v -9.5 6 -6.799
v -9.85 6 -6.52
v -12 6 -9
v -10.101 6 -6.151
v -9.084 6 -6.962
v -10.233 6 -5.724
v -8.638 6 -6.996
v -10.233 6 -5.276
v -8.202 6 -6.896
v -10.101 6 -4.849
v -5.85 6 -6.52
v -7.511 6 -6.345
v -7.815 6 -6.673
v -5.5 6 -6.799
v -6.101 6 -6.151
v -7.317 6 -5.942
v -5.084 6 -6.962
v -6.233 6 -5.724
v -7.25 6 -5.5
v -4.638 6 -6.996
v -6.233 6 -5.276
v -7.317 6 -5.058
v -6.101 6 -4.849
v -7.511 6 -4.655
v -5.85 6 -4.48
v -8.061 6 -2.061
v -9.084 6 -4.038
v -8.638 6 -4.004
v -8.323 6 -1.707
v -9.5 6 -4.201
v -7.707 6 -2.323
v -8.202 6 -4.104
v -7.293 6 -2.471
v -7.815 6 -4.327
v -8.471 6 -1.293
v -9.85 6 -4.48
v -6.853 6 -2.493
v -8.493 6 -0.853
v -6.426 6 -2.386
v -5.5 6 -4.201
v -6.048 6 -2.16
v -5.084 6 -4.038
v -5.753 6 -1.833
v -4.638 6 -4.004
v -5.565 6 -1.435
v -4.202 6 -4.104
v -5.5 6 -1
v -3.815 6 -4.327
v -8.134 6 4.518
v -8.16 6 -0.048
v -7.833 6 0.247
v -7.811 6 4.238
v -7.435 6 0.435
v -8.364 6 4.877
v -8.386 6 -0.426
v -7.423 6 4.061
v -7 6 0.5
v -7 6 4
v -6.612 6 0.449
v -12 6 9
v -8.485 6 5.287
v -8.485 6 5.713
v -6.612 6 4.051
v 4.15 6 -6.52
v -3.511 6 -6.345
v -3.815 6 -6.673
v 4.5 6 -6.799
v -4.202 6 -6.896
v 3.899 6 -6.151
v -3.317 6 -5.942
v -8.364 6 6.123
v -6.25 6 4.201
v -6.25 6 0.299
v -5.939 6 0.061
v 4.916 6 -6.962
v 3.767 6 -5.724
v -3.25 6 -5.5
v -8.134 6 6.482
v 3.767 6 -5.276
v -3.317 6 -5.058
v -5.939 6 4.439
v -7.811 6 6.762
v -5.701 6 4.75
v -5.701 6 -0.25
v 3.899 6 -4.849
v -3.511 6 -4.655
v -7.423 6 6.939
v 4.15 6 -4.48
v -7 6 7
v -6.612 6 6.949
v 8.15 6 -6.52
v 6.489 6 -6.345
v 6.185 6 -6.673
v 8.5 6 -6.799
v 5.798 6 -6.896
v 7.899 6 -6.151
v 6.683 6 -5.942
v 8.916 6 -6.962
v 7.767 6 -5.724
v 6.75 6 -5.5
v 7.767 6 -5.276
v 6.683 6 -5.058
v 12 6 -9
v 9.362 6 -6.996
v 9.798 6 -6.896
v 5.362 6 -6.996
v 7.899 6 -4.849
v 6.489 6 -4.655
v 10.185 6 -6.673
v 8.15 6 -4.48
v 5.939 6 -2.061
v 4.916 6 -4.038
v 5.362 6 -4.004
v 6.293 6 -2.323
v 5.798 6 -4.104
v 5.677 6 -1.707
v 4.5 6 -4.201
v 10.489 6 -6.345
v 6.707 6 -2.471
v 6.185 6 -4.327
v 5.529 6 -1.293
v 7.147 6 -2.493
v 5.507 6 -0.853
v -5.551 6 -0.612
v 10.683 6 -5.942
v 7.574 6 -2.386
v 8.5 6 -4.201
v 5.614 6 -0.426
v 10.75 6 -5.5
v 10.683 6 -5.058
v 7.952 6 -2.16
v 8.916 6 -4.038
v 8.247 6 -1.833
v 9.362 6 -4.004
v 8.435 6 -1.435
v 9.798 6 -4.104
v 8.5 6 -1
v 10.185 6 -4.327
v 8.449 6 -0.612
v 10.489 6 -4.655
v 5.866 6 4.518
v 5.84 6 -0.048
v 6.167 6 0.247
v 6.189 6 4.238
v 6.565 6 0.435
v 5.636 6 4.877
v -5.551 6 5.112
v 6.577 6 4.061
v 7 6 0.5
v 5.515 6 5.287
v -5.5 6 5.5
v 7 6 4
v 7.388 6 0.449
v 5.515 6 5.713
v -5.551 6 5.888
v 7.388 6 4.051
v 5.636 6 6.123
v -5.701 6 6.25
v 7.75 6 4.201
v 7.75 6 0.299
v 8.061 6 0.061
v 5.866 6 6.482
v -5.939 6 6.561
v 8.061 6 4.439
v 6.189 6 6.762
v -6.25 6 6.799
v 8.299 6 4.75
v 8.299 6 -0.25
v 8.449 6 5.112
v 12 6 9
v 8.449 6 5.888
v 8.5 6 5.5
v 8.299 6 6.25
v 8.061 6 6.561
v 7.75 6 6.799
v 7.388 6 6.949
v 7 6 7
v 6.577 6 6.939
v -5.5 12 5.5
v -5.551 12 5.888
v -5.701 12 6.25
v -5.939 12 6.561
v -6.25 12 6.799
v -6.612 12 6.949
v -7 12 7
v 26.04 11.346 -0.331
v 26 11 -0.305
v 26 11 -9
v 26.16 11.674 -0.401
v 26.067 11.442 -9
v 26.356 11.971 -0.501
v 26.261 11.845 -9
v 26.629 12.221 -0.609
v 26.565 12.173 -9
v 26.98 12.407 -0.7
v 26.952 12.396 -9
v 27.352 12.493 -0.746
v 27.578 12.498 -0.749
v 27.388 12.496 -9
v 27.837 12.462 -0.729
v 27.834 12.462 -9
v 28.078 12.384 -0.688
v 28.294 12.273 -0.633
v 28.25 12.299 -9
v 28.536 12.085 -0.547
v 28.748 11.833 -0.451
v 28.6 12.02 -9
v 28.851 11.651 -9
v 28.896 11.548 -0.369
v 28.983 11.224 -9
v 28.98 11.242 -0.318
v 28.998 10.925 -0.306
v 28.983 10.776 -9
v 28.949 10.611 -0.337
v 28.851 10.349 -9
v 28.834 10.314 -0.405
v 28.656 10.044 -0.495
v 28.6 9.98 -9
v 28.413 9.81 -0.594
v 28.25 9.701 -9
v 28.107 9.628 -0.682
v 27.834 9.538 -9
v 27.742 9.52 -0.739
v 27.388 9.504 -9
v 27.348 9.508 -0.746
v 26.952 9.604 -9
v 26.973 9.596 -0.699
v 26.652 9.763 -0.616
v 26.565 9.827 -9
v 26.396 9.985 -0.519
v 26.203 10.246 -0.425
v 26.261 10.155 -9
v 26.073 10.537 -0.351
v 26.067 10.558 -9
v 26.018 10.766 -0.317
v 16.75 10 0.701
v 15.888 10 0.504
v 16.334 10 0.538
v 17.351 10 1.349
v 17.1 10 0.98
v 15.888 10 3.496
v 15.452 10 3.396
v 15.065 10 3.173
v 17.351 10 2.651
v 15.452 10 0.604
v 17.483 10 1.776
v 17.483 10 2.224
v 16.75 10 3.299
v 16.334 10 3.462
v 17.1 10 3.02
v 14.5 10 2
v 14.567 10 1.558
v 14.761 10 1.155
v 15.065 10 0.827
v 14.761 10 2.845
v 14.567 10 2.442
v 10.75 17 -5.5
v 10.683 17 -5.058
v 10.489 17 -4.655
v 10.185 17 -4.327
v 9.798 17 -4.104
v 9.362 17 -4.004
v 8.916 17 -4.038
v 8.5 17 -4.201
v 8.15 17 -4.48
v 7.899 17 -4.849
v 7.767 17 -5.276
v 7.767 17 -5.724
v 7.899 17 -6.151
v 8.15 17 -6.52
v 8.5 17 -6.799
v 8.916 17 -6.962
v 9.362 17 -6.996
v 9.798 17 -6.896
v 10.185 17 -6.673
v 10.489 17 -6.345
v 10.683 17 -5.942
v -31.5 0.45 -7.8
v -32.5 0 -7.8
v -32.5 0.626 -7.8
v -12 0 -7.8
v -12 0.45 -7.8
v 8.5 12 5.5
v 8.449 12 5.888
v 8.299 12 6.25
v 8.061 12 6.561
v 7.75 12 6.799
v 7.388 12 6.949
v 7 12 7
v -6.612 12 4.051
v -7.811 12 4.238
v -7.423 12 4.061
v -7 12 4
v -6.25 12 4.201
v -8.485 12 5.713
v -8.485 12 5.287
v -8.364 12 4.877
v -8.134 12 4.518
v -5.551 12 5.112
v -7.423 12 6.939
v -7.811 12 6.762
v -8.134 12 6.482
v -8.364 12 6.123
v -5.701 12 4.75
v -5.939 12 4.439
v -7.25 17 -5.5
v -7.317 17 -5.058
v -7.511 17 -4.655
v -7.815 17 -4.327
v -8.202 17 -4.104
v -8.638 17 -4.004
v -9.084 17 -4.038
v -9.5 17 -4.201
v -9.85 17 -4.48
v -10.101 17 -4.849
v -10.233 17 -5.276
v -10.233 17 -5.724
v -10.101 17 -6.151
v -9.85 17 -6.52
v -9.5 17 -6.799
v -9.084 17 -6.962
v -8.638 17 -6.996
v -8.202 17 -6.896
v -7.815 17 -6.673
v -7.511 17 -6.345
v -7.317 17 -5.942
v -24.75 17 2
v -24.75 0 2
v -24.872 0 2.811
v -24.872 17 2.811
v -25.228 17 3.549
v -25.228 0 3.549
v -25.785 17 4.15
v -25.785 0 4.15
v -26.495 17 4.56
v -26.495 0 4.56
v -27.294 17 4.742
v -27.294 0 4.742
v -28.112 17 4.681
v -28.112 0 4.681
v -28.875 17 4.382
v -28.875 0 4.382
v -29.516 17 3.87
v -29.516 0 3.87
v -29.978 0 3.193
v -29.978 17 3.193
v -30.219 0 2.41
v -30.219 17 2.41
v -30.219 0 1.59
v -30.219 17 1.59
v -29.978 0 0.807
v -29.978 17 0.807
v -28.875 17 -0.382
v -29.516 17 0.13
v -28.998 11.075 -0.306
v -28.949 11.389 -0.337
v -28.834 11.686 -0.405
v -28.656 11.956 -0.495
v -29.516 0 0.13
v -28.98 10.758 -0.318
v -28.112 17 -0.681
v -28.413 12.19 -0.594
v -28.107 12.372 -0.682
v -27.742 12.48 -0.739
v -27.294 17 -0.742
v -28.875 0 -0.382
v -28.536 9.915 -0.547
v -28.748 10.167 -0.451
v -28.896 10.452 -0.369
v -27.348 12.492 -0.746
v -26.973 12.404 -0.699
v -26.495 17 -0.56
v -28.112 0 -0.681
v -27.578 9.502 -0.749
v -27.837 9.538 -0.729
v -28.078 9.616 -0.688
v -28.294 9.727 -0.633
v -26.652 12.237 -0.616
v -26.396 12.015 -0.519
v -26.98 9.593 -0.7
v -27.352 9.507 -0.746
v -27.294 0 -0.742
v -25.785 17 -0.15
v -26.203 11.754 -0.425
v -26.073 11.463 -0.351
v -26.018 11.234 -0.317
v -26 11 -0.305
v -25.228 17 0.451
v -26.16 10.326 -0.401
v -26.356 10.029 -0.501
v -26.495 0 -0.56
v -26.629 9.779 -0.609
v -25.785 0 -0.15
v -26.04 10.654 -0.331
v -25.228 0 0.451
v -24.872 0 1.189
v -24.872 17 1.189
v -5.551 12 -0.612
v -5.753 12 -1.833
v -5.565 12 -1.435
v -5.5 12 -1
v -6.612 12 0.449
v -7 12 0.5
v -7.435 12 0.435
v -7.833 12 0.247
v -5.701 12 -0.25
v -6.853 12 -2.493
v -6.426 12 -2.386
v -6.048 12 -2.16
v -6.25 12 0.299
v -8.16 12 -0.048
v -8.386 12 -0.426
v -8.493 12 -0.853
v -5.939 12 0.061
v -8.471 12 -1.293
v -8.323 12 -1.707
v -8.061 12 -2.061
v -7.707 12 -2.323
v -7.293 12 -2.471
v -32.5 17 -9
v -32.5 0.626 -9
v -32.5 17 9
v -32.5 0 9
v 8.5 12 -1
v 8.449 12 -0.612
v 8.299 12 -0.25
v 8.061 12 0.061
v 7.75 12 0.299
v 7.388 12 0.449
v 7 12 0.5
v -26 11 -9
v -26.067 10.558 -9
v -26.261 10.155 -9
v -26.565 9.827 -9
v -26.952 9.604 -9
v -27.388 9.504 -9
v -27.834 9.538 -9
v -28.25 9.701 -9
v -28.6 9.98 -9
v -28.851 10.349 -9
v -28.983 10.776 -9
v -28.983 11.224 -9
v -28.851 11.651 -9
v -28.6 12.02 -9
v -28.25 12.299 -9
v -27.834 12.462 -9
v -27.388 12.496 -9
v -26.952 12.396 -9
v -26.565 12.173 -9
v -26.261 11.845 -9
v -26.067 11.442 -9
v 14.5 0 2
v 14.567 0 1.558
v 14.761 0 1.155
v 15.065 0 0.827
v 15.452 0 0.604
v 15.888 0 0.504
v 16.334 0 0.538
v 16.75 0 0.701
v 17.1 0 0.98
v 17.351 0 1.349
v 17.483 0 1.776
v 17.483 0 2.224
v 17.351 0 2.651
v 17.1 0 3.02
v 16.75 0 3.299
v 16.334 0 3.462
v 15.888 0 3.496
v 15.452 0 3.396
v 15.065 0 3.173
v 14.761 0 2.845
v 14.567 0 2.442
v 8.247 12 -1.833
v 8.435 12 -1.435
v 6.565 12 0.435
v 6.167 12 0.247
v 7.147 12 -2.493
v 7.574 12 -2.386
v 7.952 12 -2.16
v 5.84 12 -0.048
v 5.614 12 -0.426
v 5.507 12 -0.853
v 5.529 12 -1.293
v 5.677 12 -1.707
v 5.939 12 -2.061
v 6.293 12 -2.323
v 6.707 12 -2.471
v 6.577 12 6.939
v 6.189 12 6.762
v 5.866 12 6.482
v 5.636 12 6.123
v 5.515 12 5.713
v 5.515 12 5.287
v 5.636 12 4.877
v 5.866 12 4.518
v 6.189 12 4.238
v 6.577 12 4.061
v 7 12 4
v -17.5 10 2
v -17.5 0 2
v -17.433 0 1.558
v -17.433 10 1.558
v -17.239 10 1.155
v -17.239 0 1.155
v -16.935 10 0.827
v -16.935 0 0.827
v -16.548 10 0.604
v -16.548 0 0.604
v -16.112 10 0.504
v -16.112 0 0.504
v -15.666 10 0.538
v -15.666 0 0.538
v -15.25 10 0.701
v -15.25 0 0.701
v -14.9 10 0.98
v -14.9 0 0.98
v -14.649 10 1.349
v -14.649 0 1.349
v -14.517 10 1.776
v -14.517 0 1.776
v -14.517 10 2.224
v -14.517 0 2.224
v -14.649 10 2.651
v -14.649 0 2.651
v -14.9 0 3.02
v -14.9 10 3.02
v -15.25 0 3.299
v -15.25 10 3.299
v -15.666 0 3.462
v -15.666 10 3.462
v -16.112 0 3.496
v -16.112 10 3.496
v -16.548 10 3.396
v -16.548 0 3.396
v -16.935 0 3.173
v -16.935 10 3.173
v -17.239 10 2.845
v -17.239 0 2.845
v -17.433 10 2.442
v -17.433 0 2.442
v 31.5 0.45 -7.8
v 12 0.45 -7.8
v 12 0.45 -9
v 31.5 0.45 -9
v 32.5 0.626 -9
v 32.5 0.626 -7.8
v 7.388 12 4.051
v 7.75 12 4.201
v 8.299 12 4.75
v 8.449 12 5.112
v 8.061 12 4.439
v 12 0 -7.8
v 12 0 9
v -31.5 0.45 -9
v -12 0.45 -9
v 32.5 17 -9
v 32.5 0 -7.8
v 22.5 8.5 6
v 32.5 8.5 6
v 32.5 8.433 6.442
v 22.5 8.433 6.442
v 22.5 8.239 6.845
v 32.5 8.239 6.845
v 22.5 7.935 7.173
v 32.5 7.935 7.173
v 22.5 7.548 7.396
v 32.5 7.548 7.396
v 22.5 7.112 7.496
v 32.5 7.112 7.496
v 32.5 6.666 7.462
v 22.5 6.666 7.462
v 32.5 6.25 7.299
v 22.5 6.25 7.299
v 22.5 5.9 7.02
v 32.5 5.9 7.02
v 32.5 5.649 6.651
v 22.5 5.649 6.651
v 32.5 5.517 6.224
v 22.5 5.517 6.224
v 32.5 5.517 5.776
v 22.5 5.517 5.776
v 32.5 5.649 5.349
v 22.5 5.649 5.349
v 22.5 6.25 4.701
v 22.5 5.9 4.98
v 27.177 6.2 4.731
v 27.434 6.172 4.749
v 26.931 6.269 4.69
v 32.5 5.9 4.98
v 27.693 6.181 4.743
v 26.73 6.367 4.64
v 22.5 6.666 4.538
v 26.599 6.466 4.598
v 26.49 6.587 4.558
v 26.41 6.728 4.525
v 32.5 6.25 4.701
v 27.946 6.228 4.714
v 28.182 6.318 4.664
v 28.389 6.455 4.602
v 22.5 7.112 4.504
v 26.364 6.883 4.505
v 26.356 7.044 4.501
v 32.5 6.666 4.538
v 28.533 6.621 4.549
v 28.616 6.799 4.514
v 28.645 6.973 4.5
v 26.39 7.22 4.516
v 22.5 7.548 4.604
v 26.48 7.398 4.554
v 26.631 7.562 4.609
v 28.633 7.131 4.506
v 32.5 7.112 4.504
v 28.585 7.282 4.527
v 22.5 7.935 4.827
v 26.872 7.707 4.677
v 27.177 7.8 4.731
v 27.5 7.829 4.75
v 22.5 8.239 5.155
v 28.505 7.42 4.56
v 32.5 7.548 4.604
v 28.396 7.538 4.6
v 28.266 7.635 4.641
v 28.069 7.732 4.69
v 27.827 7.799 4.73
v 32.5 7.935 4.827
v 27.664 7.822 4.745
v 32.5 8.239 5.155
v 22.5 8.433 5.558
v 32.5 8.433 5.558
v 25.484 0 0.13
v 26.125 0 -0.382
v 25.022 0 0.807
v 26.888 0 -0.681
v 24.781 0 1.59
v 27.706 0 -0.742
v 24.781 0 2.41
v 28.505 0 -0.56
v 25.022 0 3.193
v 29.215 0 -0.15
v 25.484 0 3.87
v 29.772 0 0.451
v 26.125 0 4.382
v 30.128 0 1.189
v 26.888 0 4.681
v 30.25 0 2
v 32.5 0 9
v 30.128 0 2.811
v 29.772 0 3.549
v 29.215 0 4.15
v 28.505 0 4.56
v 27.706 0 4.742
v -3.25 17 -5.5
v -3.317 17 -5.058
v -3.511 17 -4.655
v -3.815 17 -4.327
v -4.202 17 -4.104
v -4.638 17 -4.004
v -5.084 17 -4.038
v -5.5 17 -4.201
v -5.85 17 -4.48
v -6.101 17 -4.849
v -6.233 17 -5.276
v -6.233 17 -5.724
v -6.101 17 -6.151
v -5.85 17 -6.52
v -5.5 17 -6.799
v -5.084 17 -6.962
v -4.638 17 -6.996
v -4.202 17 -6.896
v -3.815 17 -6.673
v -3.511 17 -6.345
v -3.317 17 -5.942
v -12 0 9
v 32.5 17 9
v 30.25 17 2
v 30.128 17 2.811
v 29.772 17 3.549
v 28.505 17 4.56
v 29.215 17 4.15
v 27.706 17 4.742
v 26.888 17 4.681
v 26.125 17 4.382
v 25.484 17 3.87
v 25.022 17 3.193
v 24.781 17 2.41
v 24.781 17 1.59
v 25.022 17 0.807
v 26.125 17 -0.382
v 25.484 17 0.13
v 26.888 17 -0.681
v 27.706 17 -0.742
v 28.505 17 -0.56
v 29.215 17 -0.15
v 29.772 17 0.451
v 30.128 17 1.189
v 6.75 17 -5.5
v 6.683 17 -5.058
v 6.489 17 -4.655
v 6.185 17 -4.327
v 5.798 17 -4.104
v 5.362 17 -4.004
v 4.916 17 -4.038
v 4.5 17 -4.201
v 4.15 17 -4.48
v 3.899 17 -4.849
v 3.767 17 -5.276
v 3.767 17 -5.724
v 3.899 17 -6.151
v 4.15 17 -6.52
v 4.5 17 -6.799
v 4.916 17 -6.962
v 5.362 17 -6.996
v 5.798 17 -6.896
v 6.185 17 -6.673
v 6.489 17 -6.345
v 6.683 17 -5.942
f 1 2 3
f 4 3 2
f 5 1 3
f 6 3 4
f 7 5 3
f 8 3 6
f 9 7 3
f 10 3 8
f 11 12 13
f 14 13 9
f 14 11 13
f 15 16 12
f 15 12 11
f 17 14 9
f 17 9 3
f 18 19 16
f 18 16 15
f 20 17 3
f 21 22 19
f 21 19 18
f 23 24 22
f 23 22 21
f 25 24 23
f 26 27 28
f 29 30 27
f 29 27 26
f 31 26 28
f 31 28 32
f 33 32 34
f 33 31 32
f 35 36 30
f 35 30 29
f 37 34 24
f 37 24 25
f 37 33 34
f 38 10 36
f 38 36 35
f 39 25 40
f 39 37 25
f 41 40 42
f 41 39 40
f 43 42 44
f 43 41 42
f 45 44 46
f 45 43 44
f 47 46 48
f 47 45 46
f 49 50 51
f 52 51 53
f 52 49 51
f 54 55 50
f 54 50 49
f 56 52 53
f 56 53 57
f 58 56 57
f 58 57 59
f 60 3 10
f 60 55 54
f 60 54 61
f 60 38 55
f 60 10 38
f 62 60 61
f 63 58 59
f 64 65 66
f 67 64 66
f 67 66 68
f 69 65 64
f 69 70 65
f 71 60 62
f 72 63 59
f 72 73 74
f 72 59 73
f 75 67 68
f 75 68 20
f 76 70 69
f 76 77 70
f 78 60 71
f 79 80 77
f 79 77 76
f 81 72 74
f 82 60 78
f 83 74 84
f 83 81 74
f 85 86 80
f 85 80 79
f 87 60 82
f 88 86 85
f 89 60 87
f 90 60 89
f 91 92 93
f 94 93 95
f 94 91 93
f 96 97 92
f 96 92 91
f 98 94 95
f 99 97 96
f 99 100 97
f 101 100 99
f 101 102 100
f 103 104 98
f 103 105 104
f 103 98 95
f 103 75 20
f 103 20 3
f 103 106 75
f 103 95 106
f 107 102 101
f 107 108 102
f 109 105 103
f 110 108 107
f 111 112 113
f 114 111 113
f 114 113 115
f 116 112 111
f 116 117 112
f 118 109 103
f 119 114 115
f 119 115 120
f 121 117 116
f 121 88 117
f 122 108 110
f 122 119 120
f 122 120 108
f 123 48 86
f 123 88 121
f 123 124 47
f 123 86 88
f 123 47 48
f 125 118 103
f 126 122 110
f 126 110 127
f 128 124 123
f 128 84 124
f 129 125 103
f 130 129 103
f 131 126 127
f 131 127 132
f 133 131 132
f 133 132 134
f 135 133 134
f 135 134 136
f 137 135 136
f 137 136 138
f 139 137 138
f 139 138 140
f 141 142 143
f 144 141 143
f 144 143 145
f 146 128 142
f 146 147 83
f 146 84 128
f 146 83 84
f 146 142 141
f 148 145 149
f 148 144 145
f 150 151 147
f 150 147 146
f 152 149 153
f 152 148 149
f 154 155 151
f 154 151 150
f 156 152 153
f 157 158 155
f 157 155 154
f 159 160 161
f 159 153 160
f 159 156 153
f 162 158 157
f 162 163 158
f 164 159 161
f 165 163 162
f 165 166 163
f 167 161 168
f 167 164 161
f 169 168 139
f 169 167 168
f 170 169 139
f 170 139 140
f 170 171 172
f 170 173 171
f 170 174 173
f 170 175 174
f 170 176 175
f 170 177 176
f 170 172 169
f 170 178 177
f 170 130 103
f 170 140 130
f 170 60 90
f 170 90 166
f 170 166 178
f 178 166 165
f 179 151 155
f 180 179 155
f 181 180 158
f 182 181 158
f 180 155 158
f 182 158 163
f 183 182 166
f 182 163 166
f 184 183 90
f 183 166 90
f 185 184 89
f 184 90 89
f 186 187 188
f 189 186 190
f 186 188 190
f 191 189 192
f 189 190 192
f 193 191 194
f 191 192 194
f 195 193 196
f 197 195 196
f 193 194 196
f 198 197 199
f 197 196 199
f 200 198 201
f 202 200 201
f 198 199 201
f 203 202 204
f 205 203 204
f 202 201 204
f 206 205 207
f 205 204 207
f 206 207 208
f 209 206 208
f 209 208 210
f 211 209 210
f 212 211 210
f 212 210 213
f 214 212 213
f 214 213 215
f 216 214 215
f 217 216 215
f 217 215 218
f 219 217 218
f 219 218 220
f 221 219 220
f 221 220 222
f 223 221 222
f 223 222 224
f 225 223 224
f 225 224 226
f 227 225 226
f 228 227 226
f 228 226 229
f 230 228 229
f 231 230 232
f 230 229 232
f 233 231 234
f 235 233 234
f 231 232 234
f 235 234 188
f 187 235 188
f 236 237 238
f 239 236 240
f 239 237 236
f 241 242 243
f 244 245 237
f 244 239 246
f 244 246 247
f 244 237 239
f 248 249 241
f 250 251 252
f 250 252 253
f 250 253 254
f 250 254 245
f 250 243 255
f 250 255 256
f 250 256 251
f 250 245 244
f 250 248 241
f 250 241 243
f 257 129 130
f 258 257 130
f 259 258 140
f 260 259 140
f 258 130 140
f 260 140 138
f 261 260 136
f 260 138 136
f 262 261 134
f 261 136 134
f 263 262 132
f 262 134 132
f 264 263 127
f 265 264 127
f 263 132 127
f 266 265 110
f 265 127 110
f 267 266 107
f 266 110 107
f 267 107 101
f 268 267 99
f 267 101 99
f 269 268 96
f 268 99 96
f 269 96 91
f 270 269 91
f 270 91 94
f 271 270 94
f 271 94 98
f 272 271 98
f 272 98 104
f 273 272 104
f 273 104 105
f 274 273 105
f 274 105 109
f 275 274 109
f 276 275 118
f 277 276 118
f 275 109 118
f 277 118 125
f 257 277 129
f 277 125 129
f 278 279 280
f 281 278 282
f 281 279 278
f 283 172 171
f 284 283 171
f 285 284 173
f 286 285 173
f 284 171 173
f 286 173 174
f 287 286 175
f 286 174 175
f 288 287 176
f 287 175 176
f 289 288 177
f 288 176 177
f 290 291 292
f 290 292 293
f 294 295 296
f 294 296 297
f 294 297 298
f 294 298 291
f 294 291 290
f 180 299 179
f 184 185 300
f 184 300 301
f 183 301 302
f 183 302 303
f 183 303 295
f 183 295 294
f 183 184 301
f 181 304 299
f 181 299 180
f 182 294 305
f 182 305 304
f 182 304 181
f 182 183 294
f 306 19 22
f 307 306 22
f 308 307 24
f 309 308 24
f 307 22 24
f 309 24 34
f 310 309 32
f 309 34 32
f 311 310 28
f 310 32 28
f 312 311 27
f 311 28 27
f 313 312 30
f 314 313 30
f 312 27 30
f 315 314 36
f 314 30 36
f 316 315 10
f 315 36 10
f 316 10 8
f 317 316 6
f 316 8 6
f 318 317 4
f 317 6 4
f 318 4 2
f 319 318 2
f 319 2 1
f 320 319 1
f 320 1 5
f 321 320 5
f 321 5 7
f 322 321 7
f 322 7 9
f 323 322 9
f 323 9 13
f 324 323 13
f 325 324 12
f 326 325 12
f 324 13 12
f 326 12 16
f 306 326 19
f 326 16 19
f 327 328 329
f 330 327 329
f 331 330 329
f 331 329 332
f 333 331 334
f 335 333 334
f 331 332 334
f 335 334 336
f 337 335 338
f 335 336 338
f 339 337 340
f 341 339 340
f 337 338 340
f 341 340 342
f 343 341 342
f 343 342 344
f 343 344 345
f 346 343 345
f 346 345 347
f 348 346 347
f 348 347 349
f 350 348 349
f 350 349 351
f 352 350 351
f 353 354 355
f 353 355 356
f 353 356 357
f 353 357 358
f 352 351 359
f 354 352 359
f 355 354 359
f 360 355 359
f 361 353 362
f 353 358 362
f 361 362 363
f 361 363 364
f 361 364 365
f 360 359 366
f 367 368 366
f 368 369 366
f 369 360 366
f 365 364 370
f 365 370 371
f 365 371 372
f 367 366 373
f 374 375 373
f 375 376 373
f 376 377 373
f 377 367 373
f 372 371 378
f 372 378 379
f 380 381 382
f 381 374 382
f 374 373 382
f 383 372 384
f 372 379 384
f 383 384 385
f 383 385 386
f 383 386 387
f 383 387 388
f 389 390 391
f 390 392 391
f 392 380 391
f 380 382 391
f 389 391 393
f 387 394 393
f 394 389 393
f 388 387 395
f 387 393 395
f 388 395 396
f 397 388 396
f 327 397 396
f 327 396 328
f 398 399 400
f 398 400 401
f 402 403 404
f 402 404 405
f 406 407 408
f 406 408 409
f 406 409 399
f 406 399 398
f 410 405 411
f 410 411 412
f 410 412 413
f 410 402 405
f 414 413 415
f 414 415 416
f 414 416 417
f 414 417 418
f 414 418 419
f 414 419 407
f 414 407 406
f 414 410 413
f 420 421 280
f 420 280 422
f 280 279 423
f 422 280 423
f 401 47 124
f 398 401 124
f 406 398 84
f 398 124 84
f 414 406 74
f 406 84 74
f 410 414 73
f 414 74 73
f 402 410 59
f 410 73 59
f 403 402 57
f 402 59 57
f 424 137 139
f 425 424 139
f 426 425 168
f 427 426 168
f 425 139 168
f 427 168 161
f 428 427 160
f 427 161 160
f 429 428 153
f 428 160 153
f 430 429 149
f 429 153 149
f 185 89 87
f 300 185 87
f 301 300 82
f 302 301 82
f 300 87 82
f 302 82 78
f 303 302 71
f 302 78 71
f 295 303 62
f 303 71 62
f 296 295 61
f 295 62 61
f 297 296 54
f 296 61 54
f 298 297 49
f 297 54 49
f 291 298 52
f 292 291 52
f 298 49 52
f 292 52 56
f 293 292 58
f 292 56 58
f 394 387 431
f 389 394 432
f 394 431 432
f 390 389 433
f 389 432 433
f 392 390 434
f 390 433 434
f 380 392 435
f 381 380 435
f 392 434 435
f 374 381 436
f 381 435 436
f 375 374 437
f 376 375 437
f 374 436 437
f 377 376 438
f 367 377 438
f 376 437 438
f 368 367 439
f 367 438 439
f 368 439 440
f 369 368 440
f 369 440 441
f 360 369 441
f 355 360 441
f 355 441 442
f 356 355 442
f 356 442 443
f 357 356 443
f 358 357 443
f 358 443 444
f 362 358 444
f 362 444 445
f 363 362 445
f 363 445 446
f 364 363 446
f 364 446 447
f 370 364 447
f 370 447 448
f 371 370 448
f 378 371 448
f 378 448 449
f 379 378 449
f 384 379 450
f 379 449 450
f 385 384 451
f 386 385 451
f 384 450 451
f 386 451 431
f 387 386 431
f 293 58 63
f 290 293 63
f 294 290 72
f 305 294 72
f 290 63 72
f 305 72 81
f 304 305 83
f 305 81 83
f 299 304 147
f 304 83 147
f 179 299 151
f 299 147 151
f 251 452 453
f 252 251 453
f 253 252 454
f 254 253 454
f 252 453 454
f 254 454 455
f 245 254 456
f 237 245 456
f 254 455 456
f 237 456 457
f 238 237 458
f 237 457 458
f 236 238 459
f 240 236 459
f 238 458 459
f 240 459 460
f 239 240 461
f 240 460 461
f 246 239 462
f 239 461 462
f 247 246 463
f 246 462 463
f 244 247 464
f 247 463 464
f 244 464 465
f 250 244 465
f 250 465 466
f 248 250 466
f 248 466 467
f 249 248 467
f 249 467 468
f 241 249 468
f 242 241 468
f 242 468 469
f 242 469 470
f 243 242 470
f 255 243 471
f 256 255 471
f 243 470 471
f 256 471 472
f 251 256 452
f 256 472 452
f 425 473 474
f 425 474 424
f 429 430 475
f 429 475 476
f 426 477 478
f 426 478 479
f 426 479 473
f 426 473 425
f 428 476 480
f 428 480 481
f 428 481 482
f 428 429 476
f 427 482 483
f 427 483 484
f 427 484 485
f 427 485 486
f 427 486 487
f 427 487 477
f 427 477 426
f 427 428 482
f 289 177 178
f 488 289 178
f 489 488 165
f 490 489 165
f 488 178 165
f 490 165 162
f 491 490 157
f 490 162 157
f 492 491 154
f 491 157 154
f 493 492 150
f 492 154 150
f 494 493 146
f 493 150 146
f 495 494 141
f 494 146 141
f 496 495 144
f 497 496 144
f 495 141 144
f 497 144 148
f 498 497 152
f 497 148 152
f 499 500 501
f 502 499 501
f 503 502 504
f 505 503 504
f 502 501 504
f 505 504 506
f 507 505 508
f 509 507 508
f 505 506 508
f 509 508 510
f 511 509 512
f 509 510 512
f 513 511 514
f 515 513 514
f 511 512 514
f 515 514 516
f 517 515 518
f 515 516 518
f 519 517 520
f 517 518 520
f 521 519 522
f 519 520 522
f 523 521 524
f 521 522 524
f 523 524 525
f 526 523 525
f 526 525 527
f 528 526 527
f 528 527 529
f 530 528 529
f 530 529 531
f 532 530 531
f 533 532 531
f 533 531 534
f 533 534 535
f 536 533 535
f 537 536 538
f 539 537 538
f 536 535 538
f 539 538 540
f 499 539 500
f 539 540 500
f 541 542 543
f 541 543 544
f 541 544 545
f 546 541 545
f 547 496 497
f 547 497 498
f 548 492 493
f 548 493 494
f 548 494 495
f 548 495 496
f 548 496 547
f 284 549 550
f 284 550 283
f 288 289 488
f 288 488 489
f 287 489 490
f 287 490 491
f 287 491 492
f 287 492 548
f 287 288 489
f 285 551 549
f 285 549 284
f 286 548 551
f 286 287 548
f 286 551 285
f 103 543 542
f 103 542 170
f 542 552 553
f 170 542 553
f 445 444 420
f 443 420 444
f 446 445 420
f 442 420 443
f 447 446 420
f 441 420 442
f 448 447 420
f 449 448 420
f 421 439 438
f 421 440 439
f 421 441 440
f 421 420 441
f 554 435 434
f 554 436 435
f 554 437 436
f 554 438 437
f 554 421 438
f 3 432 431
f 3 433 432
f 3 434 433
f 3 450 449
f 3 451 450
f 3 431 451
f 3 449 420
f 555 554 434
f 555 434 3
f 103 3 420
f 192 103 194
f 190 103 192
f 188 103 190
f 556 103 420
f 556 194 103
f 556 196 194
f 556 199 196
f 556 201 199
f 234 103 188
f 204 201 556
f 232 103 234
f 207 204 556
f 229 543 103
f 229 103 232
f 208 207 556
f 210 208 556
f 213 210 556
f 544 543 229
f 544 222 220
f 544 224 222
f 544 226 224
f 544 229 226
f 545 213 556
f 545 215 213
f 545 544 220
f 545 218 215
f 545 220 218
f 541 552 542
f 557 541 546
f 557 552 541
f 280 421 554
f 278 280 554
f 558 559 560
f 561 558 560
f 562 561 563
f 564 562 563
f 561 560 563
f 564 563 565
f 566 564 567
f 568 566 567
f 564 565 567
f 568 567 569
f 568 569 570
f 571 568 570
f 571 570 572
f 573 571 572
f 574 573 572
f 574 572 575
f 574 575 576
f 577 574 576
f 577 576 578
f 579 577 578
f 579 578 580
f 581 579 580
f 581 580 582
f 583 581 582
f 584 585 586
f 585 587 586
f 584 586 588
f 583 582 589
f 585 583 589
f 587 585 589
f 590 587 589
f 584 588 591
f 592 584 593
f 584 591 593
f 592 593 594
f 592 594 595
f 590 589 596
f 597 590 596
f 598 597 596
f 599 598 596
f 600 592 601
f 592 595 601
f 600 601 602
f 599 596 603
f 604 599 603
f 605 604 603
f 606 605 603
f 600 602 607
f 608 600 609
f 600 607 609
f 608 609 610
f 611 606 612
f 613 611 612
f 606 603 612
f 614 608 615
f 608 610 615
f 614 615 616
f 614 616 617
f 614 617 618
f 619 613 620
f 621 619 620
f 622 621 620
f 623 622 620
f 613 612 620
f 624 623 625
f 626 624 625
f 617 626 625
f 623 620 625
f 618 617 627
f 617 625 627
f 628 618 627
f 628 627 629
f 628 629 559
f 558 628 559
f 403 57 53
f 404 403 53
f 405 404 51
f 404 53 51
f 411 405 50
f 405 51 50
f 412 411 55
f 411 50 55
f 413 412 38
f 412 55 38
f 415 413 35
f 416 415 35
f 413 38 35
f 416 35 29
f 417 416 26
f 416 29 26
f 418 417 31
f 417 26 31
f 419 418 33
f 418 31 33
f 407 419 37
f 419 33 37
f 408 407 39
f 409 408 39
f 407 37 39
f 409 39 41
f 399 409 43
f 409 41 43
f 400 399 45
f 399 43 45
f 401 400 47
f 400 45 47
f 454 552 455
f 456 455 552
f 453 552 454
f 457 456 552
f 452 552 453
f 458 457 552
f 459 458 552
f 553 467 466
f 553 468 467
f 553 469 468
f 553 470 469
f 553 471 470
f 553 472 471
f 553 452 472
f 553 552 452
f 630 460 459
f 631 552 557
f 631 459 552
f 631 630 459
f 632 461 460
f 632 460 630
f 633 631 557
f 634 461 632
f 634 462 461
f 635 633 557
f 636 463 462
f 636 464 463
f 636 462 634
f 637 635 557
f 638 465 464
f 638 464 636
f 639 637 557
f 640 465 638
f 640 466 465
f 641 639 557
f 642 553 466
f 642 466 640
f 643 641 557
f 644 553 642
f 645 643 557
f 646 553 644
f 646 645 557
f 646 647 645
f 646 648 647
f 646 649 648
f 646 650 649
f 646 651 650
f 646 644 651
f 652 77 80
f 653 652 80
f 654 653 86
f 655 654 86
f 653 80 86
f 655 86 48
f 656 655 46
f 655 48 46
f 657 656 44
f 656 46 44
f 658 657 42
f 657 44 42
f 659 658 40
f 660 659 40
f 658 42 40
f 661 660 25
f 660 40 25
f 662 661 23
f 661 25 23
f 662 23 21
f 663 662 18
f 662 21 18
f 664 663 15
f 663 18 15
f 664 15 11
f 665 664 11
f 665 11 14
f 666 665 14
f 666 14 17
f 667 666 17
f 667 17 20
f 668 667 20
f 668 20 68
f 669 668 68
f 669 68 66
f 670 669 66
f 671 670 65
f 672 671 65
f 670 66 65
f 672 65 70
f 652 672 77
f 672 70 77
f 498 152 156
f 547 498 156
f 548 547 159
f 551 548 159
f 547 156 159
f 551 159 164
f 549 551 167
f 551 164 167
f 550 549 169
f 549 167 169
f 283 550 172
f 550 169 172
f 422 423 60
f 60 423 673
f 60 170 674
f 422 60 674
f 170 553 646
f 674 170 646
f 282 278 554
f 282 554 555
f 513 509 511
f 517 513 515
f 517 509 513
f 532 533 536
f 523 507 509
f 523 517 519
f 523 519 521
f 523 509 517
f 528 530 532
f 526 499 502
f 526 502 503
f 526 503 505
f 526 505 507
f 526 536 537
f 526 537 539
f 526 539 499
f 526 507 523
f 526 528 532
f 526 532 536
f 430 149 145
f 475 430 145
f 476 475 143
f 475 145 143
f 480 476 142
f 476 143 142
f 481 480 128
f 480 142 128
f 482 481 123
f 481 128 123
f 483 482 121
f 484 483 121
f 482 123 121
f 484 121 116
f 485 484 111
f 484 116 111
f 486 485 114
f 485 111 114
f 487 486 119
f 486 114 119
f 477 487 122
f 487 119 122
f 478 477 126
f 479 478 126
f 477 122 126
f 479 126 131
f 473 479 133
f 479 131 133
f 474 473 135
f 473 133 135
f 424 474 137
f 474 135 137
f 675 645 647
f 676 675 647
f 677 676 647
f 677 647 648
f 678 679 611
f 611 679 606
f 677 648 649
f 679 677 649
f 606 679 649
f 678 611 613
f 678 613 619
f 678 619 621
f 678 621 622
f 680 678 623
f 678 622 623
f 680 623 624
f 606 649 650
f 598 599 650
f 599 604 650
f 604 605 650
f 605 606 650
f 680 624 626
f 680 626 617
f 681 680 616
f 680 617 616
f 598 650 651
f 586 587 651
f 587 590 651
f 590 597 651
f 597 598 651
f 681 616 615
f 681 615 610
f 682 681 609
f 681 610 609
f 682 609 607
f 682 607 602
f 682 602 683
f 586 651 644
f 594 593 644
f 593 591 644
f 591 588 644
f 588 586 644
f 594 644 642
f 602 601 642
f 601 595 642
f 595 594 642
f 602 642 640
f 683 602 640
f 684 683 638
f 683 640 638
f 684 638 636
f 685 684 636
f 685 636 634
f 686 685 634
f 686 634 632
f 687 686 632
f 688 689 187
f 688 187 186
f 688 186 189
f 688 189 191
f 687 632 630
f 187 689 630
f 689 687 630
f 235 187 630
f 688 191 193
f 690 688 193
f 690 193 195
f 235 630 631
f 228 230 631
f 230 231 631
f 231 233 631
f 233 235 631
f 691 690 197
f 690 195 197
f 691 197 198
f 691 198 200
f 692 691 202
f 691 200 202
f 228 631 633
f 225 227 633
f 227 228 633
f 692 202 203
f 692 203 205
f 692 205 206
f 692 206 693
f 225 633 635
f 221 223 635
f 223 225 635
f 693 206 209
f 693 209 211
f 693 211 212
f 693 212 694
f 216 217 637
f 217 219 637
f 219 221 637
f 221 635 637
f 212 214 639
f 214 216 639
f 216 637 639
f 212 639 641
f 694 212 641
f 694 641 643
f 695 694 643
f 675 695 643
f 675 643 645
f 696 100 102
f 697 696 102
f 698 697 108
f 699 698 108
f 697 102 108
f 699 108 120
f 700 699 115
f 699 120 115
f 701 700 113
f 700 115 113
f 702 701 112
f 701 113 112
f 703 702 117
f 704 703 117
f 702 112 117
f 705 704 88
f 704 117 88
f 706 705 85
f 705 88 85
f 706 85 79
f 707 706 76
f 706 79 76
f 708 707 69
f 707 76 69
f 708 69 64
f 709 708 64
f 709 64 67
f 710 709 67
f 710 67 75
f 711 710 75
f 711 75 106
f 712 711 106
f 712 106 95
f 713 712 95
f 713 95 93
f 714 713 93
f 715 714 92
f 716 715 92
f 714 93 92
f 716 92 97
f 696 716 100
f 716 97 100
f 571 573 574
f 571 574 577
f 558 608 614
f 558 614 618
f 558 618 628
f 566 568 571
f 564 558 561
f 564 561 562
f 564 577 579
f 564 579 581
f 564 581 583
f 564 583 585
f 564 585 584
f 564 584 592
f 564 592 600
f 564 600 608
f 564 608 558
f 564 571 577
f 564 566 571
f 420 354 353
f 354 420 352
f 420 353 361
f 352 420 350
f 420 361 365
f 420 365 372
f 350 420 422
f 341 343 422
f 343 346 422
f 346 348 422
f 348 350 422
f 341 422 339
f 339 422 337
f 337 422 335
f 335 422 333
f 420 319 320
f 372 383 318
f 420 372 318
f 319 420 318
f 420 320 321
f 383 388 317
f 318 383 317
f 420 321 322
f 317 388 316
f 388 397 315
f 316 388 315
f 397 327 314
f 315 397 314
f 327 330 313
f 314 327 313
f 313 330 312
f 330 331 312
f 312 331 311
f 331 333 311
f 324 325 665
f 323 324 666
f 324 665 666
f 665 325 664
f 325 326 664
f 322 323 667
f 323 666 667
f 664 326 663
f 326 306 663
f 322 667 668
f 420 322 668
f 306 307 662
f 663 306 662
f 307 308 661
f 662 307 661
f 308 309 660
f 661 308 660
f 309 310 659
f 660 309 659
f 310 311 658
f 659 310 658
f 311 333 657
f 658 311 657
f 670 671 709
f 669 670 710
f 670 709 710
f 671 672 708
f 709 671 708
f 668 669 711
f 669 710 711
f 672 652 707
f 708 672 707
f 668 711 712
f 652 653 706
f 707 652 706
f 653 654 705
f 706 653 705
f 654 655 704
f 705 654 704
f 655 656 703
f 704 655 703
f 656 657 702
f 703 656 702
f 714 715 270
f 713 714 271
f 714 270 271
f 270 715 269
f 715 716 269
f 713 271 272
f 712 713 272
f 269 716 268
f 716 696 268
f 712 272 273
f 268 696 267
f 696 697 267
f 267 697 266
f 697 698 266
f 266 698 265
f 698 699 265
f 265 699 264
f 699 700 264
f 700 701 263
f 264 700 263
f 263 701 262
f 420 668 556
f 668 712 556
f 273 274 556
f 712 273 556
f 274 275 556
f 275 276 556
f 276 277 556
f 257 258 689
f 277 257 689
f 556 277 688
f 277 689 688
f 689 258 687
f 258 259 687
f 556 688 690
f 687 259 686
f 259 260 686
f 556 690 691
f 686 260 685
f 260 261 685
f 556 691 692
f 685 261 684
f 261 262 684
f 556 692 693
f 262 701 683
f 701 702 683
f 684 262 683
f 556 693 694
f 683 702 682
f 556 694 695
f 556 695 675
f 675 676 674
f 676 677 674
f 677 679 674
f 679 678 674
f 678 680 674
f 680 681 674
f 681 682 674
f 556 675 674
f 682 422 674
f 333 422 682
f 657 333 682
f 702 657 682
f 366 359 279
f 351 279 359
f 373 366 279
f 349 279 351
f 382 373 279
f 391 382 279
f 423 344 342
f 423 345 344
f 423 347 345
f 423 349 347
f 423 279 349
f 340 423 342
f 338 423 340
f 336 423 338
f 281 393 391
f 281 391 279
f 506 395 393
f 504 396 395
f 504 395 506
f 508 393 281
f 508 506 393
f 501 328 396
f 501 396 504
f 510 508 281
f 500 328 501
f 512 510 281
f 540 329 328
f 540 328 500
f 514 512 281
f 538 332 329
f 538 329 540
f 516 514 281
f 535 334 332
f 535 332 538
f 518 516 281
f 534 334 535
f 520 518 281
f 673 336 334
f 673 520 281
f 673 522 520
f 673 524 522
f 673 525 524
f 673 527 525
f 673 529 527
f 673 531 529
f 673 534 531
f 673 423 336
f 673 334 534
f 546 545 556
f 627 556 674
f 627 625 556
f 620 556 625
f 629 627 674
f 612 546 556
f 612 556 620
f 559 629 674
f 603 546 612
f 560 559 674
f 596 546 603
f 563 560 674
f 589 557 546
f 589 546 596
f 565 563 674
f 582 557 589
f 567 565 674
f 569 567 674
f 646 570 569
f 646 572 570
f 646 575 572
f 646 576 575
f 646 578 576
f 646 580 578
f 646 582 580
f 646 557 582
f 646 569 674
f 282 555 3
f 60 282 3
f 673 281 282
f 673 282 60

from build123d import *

# Parameters (mm, degrees)
F0_W      = 65
F0_H      = 18
F1_DEPTH  = 17
F2_W      = 24
F2_H      = 18
F3_DEPTH  = 6
F4_R      = 2.75
F5_DEPTH  = 17
F7_DEPTH  = 10
F8_W      = 65
F8_H      = 1.2
F9_DEPTH  = 0.45
F11_DEPTH = 1.2
F13_DEPTH = 6
F14_R     = 1.5
F15_DEPTH = 11
F16_R     = 1.5
F17_DEPTH = 10
F18_R     = 1.5
F19_DEPTH = 10


with BuildPart() as f1:
    # F0 (on Front) → F1 (new body)
    with BuildSketch(Plane.XZ):
        Rectangle(F0_W, F0_H)
    extrude(amount=-F1_DEPTH)

    # F2 (on face) → F3 (cut)
    with BuildSketch(Plane.XZ):
        Rectangle(F2_W, F2_H)
    extrude(amount=-F3_DEPTH, mode=Mode.SUBTRACT)

    # F4 (on face) → F5 (cut, through all)
    with BuildSketch(Plane.XZ):
        with Locations((-27.5, 2)):
            Circle(F4_R)
        with Locations((27.5, 2)):
            Circle(F4_R)
    extrude(amount=-F5_DEPTH, mode=Mode.SUBTRACT)

    # F6 (on face) → F7 (cut)
    with BuildSketch(Plane.XZ):
        with BuildLine():
            ThreePointArc((-14.5, 2), (-16, 3.5), (-17.5, 2))
            Line((-17.5, 2), (-16, 2))
            Line((-16, 2), (-14.5, 2))
        make_face()
        with BuildLine():
            ThreePointArc((17.5, 2), (16, 3.5), (14.5, 2))
            ThreePointArc((14.5, 2), (16, 0.5), (17.5, 2))
        make_face()
        with BuildLine():
            Line((-16, 2), (-17.5, 2))
            ThreePointArc((-17.5, 2), (-16, 0.5), (-14.5, 2))
            Line((-14.5, 2), (-16, 2))
        make_face()
    extrude(amount=-F7_DEPTH, mode=Mode.SUBTRACT)

    # F8 (on face) → F9 (cut)
    with BuildSketch(Plane.XZ):
        with Locations((0, -8.4)):
            Rectangle(F8_W, F8_H)
    extrude(amount=-F9_DEPTH, mode=Mode.SUBTRACT)

    # F10 (on face) → F11 (cut)
    with BuildSketch(Plane(origin=(0, 0, -9), x_dir=(1, 0, 0), z_dir=(0, 0, -1))):
        Polygon((-31.5, -0.45), (-32.5, -0.45), (-32.5, -0.626327), align=None)
        Polygon((32.5, -0.626327), (32.5, -0.45), (31.5, -0.45), align=None)
    extrude(amount=-F11_DEPTH, mode=Mode.SUBTRACT)

    # F12 (on face) → F13 (cut)
    with BuildSketch(Plane.XZ.offset(-6)):
        with BuildLine():
            ThreePointArc((-5.5, -1), (-5.93934, 0.06066), (-7, 0.5))
            ThreePointArc((-7, 0.5), (-8.06066, -2.06066), (-5.5, -1))
        make_face()
        with BuildLine():
            ThreePointArc((-5.5, 5.5), (-5.93934, 6.56066), (-7, 7))
            Line((-7, 7), (-7, 5.5))
            Line((-7, 5.5), (-7, 4))
            ThreePointArc((-7, 4), (-5.93934, 4.43934), (-5.5, 5.5))
        make_face()
        with BuildLine():
            Line((-7, 5.5), (-7, 7))
            ThreePointArc((-7, 7), (-8.5, 5.5), (-7, 4))
            Line((-7, 4), (-7, 5.5))
        make_face()
        with BuildLine():
            ThreePointArc((8.5, -1), (8.06066, 0.06066), (7, 0.5))
            ThreePointArc((7, 0.5), (5.93934, -2.06066), (8.5, -1))
        make_face()
        with BuildLine():
            ThreePointArc((8.5, 5.5), (8.06066, 6.56066), (7, 7))
            Line((7, 7), (7, 5.5))
            Line((7, 5.5), (7, 4))
            ThreePointArc((7, 4), (8.06066, 4.43934), (8.5, 5.5))
        make_face()
        with BuildLine():
            Line((7, 5.5), (7, 7))
            ThreePointArc((7, 7), (5.5, 5.5), (7, 4))
            Line((7, 4), (7, 5.5))
        make_face()
    extrude(amount=-F13_DEPTH, mode=Mode.SUBTRACT)

    # F14 (on face) → F15 (cut, through all)
    with BuildSketch(Plane.XZ.offset(-6)):
        with Locations((-8.75, -5.5)):
            Circle(F14_R)
        with Locations((-4.75, -5.5)):
            Circle(F14_R)
        with Locations((5.25, -5.5)):
            Circle(F14_R)
        with Locations((9.25, -5.5)):
            Circle(F14_R)
    extrude(amount=-F15_DEPTH, mode=Mode.SUBTRACT)

    # F16 (on face) → F17 (cut)
    with BuildSketch(Plane(origin=(0, 0, -9), x_dir=(1, 0, 0), z_dir=(0, 0, -1))):
        with BuildLine():
            ThreePointArc((29, -11), (27.5, -9.5), (26, -11))
            ThreePointArc((26, -11), (27.5, -12.5), (29, -11))
        make_face()
        with Locations((-27.5, -11)):
            Circle(F16_R)
    extrude(amount=-F17_DEPTH, mode=Mode.SUBTRACT)

    # F18 (on face) → F19 (cut)
    with BuildSketch(Plane.YZ.offset(32.5)):
        with Locations((7, 6)):
            Circle(F18_R)
    extrude(amount=-F19_DEPTH, mode=Mode.SUBTRACT)


solid = f1.part
